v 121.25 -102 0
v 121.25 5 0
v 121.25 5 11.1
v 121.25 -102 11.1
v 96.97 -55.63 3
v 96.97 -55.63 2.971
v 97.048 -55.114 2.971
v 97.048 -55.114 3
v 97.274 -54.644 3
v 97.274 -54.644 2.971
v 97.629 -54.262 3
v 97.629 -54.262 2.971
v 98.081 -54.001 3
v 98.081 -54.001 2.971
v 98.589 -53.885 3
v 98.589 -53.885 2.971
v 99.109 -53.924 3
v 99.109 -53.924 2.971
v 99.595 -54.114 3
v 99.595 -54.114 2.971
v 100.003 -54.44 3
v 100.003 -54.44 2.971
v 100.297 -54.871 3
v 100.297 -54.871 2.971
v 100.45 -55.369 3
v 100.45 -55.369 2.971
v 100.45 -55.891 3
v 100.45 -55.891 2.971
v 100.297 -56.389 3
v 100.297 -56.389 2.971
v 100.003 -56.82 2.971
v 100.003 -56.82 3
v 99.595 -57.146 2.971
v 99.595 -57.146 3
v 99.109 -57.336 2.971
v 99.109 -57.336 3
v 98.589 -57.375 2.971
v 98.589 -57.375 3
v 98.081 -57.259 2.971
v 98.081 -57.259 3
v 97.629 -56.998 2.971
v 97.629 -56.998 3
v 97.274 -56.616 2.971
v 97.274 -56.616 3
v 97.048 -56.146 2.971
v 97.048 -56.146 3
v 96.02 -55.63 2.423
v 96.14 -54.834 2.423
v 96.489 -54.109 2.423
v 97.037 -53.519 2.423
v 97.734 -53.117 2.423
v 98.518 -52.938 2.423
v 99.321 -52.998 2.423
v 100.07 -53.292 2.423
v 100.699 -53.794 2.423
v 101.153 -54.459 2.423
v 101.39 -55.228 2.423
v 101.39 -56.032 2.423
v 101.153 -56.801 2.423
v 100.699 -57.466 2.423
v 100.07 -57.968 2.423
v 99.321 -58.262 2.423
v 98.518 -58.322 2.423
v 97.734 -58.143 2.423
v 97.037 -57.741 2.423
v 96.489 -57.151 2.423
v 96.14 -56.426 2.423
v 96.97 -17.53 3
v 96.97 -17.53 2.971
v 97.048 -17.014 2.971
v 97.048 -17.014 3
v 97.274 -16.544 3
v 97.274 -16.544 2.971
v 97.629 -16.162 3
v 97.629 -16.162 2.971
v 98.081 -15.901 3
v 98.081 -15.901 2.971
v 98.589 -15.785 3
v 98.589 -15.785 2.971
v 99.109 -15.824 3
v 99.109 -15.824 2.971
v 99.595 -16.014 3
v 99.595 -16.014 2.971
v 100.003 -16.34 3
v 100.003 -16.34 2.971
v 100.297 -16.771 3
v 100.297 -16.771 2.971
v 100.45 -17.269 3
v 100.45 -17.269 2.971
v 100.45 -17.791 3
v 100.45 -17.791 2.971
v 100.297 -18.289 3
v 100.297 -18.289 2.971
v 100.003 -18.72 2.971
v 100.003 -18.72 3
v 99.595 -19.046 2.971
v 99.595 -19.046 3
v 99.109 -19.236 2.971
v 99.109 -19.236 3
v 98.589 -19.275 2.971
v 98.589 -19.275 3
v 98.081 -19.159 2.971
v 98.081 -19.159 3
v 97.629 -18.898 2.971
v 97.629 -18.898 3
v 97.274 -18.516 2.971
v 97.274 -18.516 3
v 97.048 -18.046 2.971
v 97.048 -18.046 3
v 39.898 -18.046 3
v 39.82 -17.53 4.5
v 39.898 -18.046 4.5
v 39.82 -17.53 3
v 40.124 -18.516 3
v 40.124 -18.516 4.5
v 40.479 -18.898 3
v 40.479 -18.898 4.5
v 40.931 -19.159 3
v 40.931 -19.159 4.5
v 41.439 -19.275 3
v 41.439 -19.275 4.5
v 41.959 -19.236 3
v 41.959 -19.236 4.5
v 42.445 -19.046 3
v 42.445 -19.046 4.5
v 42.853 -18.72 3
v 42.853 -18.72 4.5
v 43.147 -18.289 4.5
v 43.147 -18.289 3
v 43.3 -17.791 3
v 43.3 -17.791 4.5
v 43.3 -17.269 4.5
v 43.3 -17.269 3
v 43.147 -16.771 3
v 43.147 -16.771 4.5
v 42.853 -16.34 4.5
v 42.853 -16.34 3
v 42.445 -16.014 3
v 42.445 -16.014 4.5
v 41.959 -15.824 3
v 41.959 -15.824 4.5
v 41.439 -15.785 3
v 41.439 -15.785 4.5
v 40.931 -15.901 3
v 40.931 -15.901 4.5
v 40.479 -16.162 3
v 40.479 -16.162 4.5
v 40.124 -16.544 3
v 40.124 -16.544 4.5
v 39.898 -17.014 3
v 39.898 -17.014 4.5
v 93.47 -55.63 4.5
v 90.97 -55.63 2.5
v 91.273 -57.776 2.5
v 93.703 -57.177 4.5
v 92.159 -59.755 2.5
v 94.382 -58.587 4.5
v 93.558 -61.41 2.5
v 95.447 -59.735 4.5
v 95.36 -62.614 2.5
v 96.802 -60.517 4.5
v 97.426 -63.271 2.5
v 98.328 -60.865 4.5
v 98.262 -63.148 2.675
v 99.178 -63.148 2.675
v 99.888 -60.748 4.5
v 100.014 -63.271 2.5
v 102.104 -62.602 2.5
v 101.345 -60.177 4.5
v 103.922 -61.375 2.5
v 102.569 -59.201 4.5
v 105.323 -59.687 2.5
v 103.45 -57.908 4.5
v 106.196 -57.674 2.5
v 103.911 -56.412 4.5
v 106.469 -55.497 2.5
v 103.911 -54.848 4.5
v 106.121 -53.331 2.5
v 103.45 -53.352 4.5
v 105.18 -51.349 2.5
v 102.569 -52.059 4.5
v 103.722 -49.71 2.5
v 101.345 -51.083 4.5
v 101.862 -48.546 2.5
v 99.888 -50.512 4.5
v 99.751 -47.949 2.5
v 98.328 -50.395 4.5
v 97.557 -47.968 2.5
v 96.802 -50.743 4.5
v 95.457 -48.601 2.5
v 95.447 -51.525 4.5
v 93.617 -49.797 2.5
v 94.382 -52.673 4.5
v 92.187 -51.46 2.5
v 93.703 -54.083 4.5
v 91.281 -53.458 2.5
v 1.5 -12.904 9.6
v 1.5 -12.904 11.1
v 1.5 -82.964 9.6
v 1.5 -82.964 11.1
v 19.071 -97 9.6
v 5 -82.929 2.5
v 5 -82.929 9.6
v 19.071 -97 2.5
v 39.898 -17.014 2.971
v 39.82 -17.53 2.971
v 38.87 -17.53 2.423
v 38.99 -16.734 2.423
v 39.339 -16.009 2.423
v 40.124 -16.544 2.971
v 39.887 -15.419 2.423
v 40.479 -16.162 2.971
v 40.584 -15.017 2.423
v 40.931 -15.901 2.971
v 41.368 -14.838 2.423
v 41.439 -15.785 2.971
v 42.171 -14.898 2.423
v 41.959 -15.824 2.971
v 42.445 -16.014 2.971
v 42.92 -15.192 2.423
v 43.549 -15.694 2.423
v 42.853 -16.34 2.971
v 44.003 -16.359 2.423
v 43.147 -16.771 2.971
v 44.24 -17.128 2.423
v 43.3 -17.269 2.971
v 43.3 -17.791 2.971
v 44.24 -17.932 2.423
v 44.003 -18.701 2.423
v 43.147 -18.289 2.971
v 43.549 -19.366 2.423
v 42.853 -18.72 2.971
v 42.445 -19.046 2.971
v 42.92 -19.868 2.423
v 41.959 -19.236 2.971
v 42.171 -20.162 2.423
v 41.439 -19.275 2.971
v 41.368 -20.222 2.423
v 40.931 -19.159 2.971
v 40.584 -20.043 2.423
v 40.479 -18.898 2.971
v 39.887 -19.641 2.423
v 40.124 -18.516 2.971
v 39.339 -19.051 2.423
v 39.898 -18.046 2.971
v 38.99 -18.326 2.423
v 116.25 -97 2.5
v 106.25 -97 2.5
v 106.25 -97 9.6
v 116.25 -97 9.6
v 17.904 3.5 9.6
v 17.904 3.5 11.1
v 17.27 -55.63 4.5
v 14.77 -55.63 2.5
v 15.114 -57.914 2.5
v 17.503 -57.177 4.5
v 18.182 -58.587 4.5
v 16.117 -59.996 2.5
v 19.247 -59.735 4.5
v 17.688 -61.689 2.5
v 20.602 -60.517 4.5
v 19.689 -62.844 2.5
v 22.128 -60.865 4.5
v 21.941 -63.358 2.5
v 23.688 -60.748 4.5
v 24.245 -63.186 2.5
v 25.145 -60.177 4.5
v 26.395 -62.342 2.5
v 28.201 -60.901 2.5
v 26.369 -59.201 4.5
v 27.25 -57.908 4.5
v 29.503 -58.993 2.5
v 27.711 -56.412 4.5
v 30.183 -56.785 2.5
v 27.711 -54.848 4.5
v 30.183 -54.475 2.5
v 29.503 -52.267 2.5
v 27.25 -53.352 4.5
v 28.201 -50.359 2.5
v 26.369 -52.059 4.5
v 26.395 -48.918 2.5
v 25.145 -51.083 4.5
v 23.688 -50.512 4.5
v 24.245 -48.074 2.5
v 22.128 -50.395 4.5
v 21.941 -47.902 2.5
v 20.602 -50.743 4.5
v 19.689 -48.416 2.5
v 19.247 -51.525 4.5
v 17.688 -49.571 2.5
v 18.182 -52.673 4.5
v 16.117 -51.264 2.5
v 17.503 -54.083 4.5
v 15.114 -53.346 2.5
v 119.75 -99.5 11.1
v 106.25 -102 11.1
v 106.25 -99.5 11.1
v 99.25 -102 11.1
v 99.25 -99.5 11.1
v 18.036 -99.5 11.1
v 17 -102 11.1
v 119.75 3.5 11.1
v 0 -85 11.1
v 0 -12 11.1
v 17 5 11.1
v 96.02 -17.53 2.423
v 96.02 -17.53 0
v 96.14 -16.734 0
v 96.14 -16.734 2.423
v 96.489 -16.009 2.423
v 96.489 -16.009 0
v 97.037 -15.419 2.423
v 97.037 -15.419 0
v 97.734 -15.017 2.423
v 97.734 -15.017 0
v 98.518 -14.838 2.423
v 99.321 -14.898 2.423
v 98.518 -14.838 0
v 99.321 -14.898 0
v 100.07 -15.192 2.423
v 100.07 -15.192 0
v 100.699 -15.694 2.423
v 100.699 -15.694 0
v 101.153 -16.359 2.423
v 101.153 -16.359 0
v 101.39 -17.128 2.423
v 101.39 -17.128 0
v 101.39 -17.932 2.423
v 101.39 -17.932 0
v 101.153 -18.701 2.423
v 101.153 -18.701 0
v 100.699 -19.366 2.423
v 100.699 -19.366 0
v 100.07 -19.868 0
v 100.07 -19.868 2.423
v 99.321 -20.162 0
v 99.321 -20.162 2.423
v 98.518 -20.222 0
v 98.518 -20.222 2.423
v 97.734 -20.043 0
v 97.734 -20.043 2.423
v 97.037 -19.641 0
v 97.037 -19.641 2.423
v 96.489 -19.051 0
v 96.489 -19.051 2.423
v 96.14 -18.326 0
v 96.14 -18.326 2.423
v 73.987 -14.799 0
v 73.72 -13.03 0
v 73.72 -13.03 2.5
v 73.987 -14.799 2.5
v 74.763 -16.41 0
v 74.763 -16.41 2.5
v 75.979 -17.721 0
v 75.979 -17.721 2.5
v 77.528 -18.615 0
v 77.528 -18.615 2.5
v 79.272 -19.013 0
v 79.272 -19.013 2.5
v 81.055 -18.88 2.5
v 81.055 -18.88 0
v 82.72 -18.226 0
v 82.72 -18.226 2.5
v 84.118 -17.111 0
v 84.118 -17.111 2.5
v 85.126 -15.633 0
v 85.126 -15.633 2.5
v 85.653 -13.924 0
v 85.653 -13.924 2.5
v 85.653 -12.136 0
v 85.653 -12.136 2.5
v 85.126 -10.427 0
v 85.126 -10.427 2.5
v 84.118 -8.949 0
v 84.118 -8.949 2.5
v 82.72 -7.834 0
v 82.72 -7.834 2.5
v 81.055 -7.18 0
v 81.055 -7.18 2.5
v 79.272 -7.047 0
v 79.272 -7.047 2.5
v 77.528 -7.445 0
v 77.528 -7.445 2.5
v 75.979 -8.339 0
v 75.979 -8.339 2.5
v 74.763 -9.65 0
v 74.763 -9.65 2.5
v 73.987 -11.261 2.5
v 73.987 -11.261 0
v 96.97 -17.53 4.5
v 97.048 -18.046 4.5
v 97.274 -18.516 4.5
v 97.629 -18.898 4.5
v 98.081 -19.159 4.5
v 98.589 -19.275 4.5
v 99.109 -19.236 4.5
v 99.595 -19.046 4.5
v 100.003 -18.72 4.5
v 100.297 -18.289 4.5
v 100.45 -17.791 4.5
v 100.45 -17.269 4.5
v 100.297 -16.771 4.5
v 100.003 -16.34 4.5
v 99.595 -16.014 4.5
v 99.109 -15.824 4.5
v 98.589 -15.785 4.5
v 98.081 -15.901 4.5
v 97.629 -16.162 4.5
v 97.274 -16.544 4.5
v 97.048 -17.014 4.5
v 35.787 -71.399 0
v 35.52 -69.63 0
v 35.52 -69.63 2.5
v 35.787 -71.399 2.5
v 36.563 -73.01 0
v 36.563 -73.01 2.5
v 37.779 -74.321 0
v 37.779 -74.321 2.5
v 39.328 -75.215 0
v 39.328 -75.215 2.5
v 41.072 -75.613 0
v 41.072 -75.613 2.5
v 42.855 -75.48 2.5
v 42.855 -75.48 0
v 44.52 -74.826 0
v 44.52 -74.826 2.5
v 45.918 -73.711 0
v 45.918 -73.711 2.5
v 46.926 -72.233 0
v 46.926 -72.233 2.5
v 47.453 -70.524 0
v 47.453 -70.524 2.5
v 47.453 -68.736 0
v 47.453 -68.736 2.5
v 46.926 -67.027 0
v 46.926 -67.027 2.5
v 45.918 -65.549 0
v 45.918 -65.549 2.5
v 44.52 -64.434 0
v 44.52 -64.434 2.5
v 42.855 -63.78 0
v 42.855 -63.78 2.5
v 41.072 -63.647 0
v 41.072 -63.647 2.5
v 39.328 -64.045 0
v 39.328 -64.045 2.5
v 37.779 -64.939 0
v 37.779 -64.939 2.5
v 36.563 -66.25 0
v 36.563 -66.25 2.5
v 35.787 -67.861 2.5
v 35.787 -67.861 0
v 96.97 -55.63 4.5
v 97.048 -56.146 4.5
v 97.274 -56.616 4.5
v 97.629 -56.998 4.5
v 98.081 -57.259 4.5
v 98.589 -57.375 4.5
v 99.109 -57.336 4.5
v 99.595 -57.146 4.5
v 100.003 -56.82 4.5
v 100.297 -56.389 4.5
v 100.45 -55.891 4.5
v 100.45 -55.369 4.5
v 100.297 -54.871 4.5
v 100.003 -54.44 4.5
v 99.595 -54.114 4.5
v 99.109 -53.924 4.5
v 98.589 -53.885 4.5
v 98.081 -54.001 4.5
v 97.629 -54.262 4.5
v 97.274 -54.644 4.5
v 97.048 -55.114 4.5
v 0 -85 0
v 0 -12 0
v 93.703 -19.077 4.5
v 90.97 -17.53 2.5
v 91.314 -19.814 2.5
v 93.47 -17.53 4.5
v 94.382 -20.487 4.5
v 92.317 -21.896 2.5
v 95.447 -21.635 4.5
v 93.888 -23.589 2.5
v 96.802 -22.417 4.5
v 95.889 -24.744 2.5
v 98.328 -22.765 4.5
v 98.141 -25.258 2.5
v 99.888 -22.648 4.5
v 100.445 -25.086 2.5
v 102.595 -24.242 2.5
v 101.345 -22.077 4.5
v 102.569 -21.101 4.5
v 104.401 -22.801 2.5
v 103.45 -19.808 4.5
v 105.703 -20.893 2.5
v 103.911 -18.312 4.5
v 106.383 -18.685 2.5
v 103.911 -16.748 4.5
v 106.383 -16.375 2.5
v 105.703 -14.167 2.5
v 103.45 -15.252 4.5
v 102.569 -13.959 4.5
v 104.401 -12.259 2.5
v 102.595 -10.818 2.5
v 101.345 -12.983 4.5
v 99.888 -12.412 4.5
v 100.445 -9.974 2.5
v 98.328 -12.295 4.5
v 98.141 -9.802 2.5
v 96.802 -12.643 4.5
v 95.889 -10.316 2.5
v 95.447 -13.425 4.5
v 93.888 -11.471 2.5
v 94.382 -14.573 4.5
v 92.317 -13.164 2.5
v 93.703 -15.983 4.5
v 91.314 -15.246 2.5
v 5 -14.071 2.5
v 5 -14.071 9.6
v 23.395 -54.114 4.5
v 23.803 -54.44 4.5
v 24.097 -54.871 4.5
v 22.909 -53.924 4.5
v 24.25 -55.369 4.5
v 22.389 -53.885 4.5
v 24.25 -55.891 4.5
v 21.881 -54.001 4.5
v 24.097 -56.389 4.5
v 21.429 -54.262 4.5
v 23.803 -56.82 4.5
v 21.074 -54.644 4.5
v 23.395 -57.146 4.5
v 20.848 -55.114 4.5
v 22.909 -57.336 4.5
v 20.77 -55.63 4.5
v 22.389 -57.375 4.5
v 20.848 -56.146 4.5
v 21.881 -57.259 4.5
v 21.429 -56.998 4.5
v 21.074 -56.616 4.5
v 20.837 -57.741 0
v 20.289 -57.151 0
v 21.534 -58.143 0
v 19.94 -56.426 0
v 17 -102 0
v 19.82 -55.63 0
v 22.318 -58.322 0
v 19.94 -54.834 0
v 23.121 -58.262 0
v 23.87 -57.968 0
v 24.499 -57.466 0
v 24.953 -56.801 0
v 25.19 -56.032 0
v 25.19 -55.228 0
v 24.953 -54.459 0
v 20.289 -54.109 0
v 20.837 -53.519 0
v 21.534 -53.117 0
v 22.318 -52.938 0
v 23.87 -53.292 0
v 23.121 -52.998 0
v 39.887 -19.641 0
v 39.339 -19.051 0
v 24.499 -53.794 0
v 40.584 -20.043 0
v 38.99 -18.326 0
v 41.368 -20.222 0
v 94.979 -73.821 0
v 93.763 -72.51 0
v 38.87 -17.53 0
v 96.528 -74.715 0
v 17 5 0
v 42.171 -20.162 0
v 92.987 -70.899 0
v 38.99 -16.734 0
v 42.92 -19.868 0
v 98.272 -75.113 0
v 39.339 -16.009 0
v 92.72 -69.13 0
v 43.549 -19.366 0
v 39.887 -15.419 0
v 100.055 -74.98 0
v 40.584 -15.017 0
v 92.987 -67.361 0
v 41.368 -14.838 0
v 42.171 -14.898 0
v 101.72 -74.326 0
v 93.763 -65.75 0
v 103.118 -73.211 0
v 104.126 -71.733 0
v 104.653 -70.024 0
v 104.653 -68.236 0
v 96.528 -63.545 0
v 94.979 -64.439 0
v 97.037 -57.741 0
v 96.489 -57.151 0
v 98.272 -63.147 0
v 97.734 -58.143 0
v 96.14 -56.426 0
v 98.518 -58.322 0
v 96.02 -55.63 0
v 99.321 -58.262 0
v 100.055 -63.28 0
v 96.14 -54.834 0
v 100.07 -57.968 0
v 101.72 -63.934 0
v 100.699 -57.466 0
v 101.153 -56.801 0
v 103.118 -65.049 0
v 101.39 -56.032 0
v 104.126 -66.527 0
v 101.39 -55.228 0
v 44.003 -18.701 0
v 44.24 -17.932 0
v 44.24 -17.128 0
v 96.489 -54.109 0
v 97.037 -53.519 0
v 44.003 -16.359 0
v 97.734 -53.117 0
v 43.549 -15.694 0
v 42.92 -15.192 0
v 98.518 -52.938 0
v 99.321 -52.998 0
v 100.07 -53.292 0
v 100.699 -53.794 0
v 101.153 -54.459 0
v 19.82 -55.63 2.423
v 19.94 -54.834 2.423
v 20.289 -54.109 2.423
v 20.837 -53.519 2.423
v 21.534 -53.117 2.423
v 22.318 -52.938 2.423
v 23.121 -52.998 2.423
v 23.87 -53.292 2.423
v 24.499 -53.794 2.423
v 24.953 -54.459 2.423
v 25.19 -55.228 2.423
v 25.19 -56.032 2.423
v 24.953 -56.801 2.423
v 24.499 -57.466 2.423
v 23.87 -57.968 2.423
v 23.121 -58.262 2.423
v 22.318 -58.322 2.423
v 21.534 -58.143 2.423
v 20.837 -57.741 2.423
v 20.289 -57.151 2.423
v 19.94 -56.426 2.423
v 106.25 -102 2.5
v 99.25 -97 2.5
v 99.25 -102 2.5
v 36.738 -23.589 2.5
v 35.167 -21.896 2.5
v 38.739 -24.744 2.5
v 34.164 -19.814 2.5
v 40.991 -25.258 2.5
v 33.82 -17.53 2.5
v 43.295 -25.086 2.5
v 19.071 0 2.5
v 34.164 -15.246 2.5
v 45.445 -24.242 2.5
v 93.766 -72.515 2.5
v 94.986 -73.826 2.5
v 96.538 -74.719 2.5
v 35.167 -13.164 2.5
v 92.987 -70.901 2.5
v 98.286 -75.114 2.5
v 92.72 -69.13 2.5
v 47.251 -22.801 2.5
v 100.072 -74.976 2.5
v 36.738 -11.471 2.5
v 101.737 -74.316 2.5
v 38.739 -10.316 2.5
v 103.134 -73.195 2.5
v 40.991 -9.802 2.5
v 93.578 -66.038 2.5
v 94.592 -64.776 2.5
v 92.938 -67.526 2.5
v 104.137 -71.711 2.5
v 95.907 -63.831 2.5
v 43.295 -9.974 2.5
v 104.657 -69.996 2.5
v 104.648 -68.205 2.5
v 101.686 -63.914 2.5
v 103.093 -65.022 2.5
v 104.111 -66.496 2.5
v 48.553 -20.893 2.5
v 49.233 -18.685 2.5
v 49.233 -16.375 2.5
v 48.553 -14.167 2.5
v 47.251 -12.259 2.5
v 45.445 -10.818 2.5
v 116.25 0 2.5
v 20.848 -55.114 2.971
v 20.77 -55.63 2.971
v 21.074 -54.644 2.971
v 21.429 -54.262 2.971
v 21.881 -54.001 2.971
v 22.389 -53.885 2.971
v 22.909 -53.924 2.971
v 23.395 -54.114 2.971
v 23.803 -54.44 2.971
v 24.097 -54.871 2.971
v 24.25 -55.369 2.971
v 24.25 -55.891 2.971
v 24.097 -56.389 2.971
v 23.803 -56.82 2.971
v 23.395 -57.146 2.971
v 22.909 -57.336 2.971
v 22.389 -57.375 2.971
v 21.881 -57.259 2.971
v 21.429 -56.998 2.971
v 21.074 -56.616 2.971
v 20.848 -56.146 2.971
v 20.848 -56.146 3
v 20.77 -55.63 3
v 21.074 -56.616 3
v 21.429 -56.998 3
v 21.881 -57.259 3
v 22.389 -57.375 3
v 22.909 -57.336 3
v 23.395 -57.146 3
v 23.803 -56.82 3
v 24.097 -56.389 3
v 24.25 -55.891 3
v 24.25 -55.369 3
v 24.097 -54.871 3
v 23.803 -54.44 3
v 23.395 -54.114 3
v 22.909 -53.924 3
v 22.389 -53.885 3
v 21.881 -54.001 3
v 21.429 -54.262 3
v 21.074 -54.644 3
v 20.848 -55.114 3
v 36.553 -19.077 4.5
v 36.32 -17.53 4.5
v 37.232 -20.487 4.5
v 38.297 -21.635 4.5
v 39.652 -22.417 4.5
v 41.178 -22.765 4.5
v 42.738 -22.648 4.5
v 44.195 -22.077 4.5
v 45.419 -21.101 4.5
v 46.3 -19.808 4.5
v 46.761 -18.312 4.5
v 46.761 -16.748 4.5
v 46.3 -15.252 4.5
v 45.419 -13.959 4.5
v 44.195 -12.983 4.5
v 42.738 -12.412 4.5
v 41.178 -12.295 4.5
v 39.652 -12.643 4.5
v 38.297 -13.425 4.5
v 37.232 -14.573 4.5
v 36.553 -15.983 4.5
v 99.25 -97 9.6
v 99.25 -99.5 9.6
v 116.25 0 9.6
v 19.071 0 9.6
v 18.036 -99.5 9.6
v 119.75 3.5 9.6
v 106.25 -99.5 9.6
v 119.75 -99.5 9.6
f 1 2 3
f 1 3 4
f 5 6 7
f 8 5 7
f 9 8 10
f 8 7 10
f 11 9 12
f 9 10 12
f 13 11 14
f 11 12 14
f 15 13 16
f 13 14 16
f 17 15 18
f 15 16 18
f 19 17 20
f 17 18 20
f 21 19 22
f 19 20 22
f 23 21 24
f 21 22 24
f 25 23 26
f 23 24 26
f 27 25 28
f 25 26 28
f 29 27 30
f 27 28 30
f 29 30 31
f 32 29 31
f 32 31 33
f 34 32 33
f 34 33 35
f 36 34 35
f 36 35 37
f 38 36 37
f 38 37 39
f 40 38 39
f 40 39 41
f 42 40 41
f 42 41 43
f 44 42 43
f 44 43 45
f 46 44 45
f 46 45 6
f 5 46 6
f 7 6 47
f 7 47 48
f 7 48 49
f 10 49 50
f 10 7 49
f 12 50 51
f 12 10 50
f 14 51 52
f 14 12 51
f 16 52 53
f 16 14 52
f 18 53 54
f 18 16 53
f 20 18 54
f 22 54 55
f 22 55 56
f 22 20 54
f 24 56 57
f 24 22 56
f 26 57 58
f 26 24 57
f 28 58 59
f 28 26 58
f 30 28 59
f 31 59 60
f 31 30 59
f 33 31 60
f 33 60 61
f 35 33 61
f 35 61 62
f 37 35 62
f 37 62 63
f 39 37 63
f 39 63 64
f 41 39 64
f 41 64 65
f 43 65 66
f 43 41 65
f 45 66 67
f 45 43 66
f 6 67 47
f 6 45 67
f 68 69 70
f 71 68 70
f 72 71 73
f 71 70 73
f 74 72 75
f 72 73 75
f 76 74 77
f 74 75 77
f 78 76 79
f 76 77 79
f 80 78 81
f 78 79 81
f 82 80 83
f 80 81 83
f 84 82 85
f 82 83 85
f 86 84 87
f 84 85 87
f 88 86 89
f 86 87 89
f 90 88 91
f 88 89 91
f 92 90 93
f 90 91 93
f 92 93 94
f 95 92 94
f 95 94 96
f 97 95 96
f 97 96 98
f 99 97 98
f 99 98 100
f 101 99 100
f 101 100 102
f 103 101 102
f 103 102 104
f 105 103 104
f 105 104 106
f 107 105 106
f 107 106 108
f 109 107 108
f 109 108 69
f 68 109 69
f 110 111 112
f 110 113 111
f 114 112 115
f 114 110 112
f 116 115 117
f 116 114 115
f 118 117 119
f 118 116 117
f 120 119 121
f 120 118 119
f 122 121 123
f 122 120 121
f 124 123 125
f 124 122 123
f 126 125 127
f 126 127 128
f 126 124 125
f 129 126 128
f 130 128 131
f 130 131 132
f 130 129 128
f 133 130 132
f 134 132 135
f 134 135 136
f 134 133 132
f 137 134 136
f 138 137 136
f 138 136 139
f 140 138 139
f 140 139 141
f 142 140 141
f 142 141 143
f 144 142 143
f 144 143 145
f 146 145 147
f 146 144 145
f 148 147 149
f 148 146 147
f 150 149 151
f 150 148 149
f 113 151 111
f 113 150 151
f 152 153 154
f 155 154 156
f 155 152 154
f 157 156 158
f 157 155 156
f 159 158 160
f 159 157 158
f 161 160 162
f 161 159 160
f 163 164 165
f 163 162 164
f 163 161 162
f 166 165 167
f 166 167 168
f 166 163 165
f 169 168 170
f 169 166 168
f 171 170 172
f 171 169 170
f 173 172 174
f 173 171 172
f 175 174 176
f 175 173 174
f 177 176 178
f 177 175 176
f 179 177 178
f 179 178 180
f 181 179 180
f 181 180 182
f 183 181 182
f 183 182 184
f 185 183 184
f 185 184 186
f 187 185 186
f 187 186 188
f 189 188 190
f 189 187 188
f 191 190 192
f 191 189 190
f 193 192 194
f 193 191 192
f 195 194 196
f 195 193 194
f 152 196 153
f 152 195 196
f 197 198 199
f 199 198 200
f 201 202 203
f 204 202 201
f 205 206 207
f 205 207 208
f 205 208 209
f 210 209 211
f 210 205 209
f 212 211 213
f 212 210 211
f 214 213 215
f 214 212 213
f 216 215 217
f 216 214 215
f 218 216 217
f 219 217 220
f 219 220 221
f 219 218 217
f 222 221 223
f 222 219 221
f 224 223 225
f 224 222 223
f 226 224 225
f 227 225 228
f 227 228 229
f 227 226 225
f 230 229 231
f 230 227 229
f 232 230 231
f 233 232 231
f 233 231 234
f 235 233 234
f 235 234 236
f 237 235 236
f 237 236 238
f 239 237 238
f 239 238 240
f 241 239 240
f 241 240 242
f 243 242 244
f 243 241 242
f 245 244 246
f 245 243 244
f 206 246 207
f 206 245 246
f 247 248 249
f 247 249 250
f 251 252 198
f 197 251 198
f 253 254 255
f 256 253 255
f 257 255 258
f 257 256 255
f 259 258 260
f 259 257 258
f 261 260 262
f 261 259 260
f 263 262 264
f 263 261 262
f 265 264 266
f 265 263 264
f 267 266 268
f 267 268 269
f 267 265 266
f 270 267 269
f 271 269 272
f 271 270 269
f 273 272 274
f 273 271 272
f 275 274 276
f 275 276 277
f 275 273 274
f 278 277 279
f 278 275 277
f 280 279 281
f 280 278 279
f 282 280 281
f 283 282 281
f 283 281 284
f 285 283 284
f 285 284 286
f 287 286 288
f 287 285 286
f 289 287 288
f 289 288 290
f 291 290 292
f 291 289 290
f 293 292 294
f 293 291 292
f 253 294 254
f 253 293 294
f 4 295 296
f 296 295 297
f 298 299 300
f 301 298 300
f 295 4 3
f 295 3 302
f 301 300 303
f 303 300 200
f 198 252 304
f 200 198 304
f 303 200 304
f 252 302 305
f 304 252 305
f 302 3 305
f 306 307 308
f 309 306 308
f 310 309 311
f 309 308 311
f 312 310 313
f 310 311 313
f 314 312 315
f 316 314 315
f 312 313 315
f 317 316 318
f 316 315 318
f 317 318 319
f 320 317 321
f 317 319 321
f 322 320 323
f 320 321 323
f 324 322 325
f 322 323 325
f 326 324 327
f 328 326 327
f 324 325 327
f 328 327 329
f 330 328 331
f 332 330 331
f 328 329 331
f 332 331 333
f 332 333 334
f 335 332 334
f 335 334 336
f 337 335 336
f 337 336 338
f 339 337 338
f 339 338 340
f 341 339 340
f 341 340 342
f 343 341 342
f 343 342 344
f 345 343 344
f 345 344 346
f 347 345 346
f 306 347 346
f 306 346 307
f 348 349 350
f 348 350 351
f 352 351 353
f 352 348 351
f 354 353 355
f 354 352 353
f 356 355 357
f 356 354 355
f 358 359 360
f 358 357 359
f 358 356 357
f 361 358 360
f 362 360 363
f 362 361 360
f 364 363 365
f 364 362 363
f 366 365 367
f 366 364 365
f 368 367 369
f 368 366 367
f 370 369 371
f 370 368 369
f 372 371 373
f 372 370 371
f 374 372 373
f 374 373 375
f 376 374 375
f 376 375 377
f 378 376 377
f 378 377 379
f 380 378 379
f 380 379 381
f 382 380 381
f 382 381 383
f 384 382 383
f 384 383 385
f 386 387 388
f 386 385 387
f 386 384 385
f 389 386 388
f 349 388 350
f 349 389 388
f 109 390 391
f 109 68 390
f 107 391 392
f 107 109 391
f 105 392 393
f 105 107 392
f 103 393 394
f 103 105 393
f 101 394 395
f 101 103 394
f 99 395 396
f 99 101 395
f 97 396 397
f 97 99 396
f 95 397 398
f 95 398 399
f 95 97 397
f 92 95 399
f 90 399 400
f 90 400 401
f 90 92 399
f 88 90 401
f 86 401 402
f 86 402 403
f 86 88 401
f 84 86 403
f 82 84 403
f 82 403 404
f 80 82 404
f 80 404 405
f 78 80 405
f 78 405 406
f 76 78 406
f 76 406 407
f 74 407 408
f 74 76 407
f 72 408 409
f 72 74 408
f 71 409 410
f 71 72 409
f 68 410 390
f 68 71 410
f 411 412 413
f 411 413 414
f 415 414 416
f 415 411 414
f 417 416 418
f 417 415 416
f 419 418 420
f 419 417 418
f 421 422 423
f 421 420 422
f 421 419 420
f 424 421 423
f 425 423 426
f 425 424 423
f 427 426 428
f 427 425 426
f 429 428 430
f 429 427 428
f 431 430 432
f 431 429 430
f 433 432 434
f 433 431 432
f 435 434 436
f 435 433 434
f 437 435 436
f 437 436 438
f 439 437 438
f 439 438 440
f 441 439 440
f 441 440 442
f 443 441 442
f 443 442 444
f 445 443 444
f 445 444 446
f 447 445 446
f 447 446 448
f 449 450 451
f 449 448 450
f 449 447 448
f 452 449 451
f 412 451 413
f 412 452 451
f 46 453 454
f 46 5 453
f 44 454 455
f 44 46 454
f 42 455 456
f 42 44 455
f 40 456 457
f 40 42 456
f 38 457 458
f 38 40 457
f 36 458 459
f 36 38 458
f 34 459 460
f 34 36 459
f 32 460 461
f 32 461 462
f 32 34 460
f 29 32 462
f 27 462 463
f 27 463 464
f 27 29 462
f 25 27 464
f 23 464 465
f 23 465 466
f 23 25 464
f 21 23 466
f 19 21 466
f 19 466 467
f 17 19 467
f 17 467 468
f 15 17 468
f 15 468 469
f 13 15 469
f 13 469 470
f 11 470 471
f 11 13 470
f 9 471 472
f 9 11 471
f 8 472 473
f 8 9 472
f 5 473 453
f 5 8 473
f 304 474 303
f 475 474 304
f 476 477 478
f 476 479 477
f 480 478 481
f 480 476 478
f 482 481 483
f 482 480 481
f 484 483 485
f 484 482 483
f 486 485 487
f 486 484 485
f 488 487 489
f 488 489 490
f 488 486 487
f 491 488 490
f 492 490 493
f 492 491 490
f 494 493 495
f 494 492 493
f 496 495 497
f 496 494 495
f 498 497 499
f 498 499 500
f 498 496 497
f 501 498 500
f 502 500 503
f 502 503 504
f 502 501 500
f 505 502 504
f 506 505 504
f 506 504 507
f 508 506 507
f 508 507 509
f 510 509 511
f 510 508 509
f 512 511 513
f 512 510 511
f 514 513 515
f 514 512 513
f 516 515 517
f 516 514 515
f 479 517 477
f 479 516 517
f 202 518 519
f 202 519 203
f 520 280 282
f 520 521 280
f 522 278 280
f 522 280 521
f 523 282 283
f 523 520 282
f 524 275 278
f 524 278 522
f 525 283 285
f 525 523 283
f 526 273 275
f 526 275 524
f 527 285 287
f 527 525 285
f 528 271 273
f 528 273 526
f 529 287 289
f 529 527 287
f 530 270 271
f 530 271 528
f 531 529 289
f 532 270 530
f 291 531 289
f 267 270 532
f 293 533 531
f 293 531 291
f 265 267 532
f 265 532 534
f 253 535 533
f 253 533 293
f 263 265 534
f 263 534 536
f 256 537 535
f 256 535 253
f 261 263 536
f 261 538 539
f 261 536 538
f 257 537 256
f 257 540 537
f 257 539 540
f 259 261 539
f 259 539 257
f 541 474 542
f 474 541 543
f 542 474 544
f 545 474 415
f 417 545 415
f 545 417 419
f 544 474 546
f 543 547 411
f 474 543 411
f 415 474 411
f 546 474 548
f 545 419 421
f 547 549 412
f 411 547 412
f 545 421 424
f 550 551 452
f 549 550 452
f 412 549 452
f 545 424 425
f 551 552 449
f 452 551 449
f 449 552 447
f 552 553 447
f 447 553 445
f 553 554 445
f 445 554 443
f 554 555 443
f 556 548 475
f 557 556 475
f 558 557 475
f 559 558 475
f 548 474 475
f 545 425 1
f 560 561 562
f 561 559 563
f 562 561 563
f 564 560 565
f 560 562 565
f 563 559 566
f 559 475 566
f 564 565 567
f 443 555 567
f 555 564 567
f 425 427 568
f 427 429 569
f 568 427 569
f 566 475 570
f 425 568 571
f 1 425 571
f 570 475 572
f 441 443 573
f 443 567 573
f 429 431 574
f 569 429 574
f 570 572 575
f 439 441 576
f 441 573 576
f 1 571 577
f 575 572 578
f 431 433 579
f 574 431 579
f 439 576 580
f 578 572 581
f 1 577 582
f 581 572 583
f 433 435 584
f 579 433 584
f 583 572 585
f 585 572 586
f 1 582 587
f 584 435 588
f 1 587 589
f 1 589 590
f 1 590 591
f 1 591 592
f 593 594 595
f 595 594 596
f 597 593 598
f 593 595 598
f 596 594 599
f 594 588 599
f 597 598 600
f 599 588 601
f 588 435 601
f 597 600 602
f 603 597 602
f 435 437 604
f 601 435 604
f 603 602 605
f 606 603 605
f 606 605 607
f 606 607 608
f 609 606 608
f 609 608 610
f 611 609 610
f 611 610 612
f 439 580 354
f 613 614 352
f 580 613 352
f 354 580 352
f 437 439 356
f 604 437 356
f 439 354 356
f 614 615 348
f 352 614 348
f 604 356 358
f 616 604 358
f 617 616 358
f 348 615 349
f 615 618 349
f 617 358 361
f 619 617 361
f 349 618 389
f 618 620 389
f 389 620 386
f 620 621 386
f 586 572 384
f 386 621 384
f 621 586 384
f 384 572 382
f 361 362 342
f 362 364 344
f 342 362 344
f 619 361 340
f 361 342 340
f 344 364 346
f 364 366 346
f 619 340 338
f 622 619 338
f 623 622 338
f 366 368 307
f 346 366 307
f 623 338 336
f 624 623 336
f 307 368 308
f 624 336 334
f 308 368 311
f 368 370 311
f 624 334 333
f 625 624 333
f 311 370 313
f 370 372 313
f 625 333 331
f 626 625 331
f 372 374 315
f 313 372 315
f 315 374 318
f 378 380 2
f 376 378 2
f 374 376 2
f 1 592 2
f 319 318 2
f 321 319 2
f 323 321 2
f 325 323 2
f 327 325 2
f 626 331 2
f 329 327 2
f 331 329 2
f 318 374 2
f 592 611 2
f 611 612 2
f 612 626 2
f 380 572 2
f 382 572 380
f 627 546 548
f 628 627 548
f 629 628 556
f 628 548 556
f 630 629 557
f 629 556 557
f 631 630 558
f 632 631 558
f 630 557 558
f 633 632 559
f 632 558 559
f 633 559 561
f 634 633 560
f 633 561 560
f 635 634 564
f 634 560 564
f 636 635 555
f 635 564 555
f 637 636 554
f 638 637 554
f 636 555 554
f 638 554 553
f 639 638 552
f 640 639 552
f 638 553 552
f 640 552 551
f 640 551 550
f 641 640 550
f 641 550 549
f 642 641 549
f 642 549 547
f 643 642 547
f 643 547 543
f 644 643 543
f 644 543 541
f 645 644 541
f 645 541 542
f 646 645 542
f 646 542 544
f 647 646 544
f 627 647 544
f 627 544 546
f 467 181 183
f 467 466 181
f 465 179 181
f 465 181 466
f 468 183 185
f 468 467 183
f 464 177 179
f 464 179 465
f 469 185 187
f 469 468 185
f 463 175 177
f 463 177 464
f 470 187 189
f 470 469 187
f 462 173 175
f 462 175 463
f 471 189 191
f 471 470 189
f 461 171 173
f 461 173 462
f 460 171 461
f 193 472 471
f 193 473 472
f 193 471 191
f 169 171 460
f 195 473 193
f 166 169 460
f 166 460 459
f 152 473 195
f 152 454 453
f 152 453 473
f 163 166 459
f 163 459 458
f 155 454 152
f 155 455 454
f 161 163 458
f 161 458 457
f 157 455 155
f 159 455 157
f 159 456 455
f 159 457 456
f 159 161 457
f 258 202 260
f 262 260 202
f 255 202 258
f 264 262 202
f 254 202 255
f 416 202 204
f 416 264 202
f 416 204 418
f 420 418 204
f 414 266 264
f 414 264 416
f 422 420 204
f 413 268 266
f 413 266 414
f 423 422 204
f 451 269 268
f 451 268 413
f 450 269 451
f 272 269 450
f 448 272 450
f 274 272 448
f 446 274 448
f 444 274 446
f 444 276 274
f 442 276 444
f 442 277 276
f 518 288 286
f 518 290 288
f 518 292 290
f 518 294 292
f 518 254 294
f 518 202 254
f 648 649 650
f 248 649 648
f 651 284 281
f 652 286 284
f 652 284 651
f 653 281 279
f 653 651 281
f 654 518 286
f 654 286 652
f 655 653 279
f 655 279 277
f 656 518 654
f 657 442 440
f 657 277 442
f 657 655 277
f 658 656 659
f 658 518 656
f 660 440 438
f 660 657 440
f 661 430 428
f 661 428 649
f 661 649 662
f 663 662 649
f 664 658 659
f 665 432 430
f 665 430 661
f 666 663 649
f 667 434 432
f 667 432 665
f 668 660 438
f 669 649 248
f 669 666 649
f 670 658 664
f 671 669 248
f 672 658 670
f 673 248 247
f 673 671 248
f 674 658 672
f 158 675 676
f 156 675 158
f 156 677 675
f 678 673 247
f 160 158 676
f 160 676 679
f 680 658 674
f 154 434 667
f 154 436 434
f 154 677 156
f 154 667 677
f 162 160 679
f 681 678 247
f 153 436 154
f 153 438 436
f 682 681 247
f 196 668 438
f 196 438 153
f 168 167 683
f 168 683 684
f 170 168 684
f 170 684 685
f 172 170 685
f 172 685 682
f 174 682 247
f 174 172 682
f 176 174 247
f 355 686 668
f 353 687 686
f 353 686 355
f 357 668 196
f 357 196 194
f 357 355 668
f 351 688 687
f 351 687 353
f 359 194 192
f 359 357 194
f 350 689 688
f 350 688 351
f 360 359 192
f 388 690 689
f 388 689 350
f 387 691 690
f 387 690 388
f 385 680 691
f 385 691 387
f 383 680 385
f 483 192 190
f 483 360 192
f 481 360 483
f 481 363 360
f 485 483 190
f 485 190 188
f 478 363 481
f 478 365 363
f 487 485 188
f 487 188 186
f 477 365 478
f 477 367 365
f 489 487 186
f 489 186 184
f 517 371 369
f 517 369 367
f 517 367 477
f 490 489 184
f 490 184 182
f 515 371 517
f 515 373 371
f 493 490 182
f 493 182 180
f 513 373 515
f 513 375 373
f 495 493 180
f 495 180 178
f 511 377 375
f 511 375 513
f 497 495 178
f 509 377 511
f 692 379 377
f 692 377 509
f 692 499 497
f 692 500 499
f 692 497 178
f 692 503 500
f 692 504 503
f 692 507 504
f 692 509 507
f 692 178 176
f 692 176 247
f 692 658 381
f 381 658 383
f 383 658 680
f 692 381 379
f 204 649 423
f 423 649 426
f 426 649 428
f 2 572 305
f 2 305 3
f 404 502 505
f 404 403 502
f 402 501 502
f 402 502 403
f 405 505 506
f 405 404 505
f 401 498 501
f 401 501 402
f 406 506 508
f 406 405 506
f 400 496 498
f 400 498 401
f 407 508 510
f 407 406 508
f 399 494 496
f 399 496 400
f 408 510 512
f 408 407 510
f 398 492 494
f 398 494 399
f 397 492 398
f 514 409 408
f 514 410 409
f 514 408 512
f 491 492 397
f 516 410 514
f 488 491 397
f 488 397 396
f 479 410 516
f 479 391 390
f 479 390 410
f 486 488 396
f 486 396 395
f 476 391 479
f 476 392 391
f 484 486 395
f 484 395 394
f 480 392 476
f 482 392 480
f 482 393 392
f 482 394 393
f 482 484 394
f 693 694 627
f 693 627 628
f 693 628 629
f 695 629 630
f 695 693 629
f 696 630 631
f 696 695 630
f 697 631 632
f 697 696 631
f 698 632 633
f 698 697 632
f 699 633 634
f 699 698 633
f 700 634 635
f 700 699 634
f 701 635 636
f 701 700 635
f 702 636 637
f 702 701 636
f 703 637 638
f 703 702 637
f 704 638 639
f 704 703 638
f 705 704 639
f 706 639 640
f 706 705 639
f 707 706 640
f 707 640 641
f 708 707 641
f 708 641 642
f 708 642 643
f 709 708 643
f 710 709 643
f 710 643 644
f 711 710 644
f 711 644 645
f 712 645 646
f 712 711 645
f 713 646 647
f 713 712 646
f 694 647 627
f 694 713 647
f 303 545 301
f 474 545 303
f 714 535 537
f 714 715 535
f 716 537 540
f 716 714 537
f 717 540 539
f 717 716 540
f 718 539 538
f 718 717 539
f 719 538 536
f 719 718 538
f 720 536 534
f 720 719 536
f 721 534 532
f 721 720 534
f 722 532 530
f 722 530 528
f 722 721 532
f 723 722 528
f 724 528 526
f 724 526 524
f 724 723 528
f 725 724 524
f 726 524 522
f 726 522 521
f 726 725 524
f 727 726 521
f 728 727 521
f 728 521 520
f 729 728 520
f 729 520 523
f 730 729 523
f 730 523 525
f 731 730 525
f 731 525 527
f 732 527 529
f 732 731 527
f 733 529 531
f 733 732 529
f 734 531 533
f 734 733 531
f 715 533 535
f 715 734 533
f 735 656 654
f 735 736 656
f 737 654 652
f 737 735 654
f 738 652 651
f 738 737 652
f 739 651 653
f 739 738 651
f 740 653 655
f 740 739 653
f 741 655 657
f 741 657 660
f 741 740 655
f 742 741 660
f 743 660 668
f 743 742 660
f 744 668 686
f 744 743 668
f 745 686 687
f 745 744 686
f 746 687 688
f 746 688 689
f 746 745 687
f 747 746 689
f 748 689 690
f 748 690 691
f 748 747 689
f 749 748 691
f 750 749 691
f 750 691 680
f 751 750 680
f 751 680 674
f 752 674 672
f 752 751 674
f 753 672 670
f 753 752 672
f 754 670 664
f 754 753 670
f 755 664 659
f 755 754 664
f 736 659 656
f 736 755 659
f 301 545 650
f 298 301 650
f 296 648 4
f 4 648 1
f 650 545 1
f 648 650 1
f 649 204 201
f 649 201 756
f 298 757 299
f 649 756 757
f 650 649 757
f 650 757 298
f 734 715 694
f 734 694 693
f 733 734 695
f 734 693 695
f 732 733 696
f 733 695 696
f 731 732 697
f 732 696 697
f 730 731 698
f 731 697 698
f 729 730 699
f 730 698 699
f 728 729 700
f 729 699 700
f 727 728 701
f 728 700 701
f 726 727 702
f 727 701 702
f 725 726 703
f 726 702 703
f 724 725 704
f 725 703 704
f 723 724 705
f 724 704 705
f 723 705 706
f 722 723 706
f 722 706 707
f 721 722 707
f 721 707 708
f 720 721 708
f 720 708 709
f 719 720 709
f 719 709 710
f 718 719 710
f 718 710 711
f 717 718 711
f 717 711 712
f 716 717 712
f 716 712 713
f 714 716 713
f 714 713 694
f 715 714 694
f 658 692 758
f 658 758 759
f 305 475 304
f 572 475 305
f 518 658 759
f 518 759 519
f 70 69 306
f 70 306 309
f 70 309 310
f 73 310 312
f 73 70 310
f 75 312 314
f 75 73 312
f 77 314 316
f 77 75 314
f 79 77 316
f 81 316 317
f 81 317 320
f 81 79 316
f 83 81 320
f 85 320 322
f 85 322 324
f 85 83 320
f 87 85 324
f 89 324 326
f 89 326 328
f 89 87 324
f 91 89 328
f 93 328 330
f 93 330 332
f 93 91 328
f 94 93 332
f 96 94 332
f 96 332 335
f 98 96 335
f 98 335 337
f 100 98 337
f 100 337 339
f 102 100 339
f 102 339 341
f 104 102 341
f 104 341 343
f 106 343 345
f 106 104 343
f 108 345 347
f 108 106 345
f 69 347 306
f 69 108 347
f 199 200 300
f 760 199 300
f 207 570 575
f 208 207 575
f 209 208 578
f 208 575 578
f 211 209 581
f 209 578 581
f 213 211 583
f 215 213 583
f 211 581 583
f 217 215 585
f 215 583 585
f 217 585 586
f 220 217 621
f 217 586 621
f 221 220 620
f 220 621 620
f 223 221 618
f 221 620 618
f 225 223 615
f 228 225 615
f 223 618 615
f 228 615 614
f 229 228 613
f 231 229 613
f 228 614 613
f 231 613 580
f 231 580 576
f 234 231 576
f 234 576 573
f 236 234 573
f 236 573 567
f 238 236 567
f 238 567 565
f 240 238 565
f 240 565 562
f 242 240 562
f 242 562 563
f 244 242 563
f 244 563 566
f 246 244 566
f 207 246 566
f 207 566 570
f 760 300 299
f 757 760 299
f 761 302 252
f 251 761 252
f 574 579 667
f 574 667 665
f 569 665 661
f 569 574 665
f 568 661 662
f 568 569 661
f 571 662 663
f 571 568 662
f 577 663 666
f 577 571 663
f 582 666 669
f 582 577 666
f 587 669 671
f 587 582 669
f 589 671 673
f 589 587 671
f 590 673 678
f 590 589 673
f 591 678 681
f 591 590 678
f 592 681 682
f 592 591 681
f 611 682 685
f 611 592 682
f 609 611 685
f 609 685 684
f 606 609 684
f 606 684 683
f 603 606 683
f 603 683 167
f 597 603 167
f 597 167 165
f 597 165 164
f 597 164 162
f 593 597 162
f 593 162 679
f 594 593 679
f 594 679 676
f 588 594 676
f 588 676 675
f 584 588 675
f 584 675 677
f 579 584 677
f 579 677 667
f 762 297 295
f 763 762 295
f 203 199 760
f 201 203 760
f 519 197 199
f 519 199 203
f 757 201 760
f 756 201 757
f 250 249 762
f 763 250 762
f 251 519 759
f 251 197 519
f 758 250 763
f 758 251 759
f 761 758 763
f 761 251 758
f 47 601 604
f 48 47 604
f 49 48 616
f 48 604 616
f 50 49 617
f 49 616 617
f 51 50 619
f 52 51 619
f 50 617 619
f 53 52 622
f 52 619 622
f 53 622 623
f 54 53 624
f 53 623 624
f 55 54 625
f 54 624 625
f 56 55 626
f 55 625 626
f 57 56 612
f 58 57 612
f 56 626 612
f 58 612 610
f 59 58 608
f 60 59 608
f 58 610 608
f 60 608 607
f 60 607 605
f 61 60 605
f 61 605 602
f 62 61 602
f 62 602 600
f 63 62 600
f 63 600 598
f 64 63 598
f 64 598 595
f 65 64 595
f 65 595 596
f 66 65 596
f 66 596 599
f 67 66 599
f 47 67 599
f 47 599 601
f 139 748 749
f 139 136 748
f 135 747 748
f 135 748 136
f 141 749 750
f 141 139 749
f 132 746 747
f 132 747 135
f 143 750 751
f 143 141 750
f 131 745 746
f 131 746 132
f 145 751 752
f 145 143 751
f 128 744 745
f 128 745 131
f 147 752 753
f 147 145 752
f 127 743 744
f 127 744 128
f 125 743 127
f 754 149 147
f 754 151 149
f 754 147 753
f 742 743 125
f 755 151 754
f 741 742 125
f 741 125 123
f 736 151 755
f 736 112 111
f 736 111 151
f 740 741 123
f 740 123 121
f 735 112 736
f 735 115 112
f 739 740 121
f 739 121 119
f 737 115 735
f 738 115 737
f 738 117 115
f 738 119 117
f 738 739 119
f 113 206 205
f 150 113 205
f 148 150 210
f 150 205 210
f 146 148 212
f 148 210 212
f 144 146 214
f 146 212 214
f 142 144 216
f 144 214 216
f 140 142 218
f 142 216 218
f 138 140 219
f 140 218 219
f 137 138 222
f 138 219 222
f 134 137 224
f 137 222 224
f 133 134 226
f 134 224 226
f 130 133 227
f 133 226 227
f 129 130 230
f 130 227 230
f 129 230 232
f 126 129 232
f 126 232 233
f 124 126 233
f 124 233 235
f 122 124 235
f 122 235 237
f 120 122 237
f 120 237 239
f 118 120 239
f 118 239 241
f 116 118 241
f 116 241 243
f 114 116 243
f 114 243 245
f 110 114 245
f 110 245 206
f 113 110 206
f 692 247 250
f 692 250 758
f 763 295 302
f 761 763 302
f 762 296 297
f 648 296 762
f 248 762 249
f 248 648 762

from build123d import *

# Parameters (mm, degrees)
BOSS_EXTRU_1_DEPTH           = 2.5
BOSS_EXTRU_2_DEPTH           = 8.6
ESQUISSE15_W                 = 1.8
ESQUISSE15_H                 = 2.5
D_GAGEMENT_M31_AT_2_COUNT    = 2
D_GAGEMENT_M31_AT_2_PITCH    = 76.2
D_GAGEMENT_M31_AT_3_COUNT    = 2
D_GAGEMENT_M31_AT_3_PITCH    = 38.1
D_GAGEMENT_M31_AT_4_COUNT    = 2
D_GAGEMENT_M31_AT_4_PITCH    = 68.685751798
ESQUISSE16_R                 = 2.7
ENL_V_MAT_EXTRU_2_DEPTH      = 3
ENL_V_MAT_EXTRU_3_DEPTH      = 1.5
ENL_V_MAT_EXTRU_4_DEPTH      = 10
ENL_V_MAT_EXTRU_4_DEPTH_BACK = 10
ESQUISSE20_R                 = 6
CHANFREIN3_SIZE              = 0.577350269
CHANFREIN3_SIZE_2            = 1


with BuildPart() as part:
    # Esquisse1 → Boss.-Extru.1 (new body)
    with BuildSketch(Plane.XY):
        Polygon((0, -85), (17, -102), (121.25, -102), (121.25, 5), (17, 5), (0, -12), align=None)
    extrude(amount=BOSS_EXTRU_1_DEPTH)

    # Esquisse2 → Boss.-Extru.2 (add)
    with BuildSketch(Plane.XY.offset(2.5)):
        Polygon((5, -82.928932188), (19.071067812, -97), (99.25, -97), (99.25, -102), (17, -102), (0, -85), (0, -12), (17, 5), (121.25, 5), (121.25, -102), (106.25, -102), (106.25, -97), (116.25, -97), (116.25, 0), (19.071067812, 0), (5, -14.071067812), align=None)
    extrude(amount=BOSS_EXTRU_2_DEPTH)

    # Esquisse9 → Révolution1 (revolve)
    with BuildSketch(Plane(origin=(0, -55.63, 0), x_dir=(-1, 0, 0), z_dir=(0, -1, 0))):
        Polygon((-96.97, -2.5), (-90.97, -2.5), (-93.47, -4.5), (-96.97, -4.5), align=None)
    revolve(axis=Axis((98.72, -55.63, 2.5), (0, 0, 1)))

    # Esquisse11 → Révolution2 (revolve)
    with BuildSketch(Plane(origin=(0, -55.63, 0), x_dir=(-1, 0, 0), z_dir=(0, -1, 0)), mode=Mode.PRIVATE) as r_volution2_sk:
        Polygon((-24.27, -2.5), (-30.27, -2.5), (-27.77, -4.5), (-24.27, -4.5), align=None)
    revolve(r_volution2_sk.sketch.rotate(Axis((22.52, -55.63, 2.5), (0, 0, 1)), 180), axis=Axis((22.52, -55.63, 2.5), (0, 0, 1)))

    # Esquisse12 → Révolution3 (revolve)
    with BuildSketch(Plane(origin=(0, -17.53, 0), x_dir=(1, 0, 0), z_dir=(0, 1, 0))):
        Polygon((96.97, -2.5), (90.97, -2.5), (93.47, -4.5), (96.97, -4.5), align=None)
    revolve(axis=Axis((98.72, -17.53, 2.5), (0, 0, 1)))

    # Esquisse13 → Révolution4 (revolve)
    with BuildSketch(Plane(origin=(0, -17.53, 0), x_dir=(1, 0, 0), z_dir=(0, 1, 0)), mode=Mode.PRIVATE) as r_volution4_sk:
        Polygon((43.32, -2.5), (49.32, -2.5), (46.82, -4.5), (43.32, -4.5), align=None)
    revolve(r_volution4_sk.sketch.rotate(Axis((41.57, -17.53, 2.5), (0, 0, 1)), 180), axis=Axis((41.57, -17.53, 2.5), (0, 0, 1)))

    # Esquisse15 → Dégagement M31 (revolve, cut)
    with BuildSketch(Plane(origin=(98.72, -55.63, 2.5), x_dir=(0, -1, 0), z_dir=(1, 0, 0))):
        with Locations((0.9, 1.25)):
            Rectangle(ESQUISSE15_W, ESQUISSE15_H)
    d_gagement_m31 = revolve(axis=Axis((98.72, -55.63, 8.85), (0, 0, -1)), mode=Mode.SUBTRACT)

    # Dégagement M31 at 2: Dégagement M31 ×2
    with Locations(*[(-i * D_GAGEMENT_M31_AT_2_PITCH, 0, 0) for i in range(1, D_GAGEMENT_M31_AT_2_COUNT)]):
        add(d_gagement_m31, mode=Mode.SUBTRACT)

    # Dégagement M31 at 3: Dégagement M31 ×2
    with Locations(*[(0, i * D_GAGEMENT_M31_AT_3_PITCH, 0) for i in range(1, D_GAGEMENT_M31_AT_3_COUNT)]):
        add(d_gagement_m31, mode=Mode.SUBTRACT)

    # Dégagement M31 at 4: Dégagement M31 ×2
    with Locations(*[Vector(-0.8320502943378437, 0.5547001962252291, 0) * (i * D_GAGEMENT_M31_AT_4_PITCH) for i in range(1, D_GAGEMENT_M31_AT_4_COUNT)]):
        add(d_gagement_m31, mode=Mode.SUBTRACT)

    # Esquisse16 → Enlèv. mat.-Extru.2 (cut)
    with BuildSketch(Plane(origin=(0, 0, 0), x_dir=(-1, 0, 0), z_dir=(0, 0, -1))):
        with Locations((-22.52, -55.63)):
            Circle(ESQUISSE16_R)
        with Locations((-98.72, -55.63)):
            Circle(ESQUISSE16_R)
        with Locations((-98.72, -17.53)):
            Circle(ESQUISSE16_R)
        with Locations((-41.57, -17.53)):
            Circle(ESQUISSE16_R)
    extrude(amount=-ENL_V_MAT_EXTRU_2_DEPTH, mode=Mode.SUBTRACT)

    # Esquisse17 → Enlèv. mat.-Extru.3 (cut)
    with BuildSketch(Plane.XY.offset(11.1)):
        Polygon((119.75, -99.5), (119.75, 3.5), (17.904163056, 3.5), (1.5, -12.904163056), (1.5, -82.964466094), (18.035533906, -99.5), align=None)
    extrude(amount=-ENL_V_MAT_EXTRU_3_DEPTH, mode=Mode.SUBTRACT)

    # Esquisse20 → Enlèv. mat.-Extru.4 (cut, two sides: drawn at the far end of the back side and taken through both)
    with BuildSketch(Plane.XY.offset(2.5).offset(-ENL_V_MAT_EXTRU_4_DEPTH_BACK)):
        with Locations(Location((98.72, -69.13, 0), (0, 0, 180))):
            Circle(ESQUISSE20_R)
        with Locations(Location((41.52, -69.63, 0), (0, 0, 180))):
            Circle(ESQUISSE20_R)
        with Locations(Location((79.72, -13.03, 0), (0, 0, 180))):
            Circle(ESQUISSE20_R)
    extrude(amount=ENL_V_MAT_EXTRU_4_DEPTH + ENL_V_MAT_EXTRU_4_DEPTH_BACK, mode=Mode.SUBTRACT)

    # Chanfrein3
    # the kernel refuses this chamfer: 1, 0.577350269 mm, written as the material it adds along each edge
    with BuildSketch(Plane(origin=(41.57, -17.53, 3), x_dir=(-1, 0, 0), z_dir=(0, -1, 0))) as chanfrein3_piece_1_section:
        Polygon((2.7, CHANFREIN3_SIZE), (2.7 - CHANFREIN3_SIZE_2, 0), (2.7, 0), align=None)
    chanfrein3_piece_1 = revolve(axis=Axis((41.57, -17.53, 3), (0, 0, -1)), mode=Mode.PRIVATE)
    chanfrein3_piece_1 = chanfrein3_piece_1 - Plane(origin=(41.57, -17.53, 2.701530762), x_dir=(-1, 0, 0), z_dir=(0, 0, -1)) * Cylinder(1.75, 11, mode=Mode.PRIVATE)
    add(chanfrein3_piece_1)
    with BuildSketch(Plane(origin=(98.72, -17.53, 3), x_dir=(-1, 0, 0), z_dir=(0, -1, 0))) as chanfrein3_piece_2_section:
        Polygon((2.7, CHANFREIN3_SIZE), (2.7 - CHANFREIN3_SIZE_2, 0), (2.7, 0), align=None)
    chanfrein3_piece_2 = revolve(axis=Axis((98.72, -17.53, 3), (0, 0, -1)), mode=Mode.PRIVATE)
    chanfrein3_piece_2 = chanfrein3_piece_2 - Plane(origin=(98.72, -17.53, 2.701530762), x_dir=(-1, 0, 0), z_dir=(0, 0, -1)) * Cylinder(1.75, 11, mode=Mode.PRIVATE)
    add(chanfrein3_piece_2)
    with BuildSketch(Plane(origin=(98.72, -55.63, 3), x_dir=(-1, 0, 0), z_dir=(0, -1, 0))) as chanfrein3_piece_3_section:
        Polygon((2.7, CHANFREIN3_SIZE), (2.7 - CHANFREIN3_SIZE_2, 0), (2.7, 0), align=None)
    chanfrein3_piece_3 = revolve(axis=Axis((98.72, -55.63, 3), (0, 0, -1)), mode=Mode.PRIVATE)
    chanfrein3_piece_3 = chanfrein3_piece_3 - Plane(origin=(98.72, -55.63, 2.701530762), x_dir=(-1, 0, 0), z_dir=(0, 0, -1)) * Cylinder(1.75, 11, mode=Mode.PRIVATE)
    add(chanfrein3_piece_3)
    with BuildSketch(Plane(origin=(22.52, -55.63, 3), x_dir=(-1, 0, 0), z_dir=(0, -1, 0))) as chanfrein3_piece_4_section:
        Polygon((2.7, CHANFREIN3_SIZE), (2.7 - CHANFREIN3_SIZE_2, 0), (2.7, 0), align=None)
    chanfrein3_piece_4 = revolve(axis=Axis((22.52, -55.63, 3), (0, 0, -1)), mode=Mode.PRIVATE)
    chanfrein3_piece_4 = chanfrein3_piece_4 - Plane(origin=(22.52, -55.63, 2.701530762), x_dir=(-1, 0, 0), z_dir=(0, 0, -1)) * Cylinder(1.75, 11, mode=Mode.PRIVATE)
    add(chanfrein3_piece_4)


solid = part.part
